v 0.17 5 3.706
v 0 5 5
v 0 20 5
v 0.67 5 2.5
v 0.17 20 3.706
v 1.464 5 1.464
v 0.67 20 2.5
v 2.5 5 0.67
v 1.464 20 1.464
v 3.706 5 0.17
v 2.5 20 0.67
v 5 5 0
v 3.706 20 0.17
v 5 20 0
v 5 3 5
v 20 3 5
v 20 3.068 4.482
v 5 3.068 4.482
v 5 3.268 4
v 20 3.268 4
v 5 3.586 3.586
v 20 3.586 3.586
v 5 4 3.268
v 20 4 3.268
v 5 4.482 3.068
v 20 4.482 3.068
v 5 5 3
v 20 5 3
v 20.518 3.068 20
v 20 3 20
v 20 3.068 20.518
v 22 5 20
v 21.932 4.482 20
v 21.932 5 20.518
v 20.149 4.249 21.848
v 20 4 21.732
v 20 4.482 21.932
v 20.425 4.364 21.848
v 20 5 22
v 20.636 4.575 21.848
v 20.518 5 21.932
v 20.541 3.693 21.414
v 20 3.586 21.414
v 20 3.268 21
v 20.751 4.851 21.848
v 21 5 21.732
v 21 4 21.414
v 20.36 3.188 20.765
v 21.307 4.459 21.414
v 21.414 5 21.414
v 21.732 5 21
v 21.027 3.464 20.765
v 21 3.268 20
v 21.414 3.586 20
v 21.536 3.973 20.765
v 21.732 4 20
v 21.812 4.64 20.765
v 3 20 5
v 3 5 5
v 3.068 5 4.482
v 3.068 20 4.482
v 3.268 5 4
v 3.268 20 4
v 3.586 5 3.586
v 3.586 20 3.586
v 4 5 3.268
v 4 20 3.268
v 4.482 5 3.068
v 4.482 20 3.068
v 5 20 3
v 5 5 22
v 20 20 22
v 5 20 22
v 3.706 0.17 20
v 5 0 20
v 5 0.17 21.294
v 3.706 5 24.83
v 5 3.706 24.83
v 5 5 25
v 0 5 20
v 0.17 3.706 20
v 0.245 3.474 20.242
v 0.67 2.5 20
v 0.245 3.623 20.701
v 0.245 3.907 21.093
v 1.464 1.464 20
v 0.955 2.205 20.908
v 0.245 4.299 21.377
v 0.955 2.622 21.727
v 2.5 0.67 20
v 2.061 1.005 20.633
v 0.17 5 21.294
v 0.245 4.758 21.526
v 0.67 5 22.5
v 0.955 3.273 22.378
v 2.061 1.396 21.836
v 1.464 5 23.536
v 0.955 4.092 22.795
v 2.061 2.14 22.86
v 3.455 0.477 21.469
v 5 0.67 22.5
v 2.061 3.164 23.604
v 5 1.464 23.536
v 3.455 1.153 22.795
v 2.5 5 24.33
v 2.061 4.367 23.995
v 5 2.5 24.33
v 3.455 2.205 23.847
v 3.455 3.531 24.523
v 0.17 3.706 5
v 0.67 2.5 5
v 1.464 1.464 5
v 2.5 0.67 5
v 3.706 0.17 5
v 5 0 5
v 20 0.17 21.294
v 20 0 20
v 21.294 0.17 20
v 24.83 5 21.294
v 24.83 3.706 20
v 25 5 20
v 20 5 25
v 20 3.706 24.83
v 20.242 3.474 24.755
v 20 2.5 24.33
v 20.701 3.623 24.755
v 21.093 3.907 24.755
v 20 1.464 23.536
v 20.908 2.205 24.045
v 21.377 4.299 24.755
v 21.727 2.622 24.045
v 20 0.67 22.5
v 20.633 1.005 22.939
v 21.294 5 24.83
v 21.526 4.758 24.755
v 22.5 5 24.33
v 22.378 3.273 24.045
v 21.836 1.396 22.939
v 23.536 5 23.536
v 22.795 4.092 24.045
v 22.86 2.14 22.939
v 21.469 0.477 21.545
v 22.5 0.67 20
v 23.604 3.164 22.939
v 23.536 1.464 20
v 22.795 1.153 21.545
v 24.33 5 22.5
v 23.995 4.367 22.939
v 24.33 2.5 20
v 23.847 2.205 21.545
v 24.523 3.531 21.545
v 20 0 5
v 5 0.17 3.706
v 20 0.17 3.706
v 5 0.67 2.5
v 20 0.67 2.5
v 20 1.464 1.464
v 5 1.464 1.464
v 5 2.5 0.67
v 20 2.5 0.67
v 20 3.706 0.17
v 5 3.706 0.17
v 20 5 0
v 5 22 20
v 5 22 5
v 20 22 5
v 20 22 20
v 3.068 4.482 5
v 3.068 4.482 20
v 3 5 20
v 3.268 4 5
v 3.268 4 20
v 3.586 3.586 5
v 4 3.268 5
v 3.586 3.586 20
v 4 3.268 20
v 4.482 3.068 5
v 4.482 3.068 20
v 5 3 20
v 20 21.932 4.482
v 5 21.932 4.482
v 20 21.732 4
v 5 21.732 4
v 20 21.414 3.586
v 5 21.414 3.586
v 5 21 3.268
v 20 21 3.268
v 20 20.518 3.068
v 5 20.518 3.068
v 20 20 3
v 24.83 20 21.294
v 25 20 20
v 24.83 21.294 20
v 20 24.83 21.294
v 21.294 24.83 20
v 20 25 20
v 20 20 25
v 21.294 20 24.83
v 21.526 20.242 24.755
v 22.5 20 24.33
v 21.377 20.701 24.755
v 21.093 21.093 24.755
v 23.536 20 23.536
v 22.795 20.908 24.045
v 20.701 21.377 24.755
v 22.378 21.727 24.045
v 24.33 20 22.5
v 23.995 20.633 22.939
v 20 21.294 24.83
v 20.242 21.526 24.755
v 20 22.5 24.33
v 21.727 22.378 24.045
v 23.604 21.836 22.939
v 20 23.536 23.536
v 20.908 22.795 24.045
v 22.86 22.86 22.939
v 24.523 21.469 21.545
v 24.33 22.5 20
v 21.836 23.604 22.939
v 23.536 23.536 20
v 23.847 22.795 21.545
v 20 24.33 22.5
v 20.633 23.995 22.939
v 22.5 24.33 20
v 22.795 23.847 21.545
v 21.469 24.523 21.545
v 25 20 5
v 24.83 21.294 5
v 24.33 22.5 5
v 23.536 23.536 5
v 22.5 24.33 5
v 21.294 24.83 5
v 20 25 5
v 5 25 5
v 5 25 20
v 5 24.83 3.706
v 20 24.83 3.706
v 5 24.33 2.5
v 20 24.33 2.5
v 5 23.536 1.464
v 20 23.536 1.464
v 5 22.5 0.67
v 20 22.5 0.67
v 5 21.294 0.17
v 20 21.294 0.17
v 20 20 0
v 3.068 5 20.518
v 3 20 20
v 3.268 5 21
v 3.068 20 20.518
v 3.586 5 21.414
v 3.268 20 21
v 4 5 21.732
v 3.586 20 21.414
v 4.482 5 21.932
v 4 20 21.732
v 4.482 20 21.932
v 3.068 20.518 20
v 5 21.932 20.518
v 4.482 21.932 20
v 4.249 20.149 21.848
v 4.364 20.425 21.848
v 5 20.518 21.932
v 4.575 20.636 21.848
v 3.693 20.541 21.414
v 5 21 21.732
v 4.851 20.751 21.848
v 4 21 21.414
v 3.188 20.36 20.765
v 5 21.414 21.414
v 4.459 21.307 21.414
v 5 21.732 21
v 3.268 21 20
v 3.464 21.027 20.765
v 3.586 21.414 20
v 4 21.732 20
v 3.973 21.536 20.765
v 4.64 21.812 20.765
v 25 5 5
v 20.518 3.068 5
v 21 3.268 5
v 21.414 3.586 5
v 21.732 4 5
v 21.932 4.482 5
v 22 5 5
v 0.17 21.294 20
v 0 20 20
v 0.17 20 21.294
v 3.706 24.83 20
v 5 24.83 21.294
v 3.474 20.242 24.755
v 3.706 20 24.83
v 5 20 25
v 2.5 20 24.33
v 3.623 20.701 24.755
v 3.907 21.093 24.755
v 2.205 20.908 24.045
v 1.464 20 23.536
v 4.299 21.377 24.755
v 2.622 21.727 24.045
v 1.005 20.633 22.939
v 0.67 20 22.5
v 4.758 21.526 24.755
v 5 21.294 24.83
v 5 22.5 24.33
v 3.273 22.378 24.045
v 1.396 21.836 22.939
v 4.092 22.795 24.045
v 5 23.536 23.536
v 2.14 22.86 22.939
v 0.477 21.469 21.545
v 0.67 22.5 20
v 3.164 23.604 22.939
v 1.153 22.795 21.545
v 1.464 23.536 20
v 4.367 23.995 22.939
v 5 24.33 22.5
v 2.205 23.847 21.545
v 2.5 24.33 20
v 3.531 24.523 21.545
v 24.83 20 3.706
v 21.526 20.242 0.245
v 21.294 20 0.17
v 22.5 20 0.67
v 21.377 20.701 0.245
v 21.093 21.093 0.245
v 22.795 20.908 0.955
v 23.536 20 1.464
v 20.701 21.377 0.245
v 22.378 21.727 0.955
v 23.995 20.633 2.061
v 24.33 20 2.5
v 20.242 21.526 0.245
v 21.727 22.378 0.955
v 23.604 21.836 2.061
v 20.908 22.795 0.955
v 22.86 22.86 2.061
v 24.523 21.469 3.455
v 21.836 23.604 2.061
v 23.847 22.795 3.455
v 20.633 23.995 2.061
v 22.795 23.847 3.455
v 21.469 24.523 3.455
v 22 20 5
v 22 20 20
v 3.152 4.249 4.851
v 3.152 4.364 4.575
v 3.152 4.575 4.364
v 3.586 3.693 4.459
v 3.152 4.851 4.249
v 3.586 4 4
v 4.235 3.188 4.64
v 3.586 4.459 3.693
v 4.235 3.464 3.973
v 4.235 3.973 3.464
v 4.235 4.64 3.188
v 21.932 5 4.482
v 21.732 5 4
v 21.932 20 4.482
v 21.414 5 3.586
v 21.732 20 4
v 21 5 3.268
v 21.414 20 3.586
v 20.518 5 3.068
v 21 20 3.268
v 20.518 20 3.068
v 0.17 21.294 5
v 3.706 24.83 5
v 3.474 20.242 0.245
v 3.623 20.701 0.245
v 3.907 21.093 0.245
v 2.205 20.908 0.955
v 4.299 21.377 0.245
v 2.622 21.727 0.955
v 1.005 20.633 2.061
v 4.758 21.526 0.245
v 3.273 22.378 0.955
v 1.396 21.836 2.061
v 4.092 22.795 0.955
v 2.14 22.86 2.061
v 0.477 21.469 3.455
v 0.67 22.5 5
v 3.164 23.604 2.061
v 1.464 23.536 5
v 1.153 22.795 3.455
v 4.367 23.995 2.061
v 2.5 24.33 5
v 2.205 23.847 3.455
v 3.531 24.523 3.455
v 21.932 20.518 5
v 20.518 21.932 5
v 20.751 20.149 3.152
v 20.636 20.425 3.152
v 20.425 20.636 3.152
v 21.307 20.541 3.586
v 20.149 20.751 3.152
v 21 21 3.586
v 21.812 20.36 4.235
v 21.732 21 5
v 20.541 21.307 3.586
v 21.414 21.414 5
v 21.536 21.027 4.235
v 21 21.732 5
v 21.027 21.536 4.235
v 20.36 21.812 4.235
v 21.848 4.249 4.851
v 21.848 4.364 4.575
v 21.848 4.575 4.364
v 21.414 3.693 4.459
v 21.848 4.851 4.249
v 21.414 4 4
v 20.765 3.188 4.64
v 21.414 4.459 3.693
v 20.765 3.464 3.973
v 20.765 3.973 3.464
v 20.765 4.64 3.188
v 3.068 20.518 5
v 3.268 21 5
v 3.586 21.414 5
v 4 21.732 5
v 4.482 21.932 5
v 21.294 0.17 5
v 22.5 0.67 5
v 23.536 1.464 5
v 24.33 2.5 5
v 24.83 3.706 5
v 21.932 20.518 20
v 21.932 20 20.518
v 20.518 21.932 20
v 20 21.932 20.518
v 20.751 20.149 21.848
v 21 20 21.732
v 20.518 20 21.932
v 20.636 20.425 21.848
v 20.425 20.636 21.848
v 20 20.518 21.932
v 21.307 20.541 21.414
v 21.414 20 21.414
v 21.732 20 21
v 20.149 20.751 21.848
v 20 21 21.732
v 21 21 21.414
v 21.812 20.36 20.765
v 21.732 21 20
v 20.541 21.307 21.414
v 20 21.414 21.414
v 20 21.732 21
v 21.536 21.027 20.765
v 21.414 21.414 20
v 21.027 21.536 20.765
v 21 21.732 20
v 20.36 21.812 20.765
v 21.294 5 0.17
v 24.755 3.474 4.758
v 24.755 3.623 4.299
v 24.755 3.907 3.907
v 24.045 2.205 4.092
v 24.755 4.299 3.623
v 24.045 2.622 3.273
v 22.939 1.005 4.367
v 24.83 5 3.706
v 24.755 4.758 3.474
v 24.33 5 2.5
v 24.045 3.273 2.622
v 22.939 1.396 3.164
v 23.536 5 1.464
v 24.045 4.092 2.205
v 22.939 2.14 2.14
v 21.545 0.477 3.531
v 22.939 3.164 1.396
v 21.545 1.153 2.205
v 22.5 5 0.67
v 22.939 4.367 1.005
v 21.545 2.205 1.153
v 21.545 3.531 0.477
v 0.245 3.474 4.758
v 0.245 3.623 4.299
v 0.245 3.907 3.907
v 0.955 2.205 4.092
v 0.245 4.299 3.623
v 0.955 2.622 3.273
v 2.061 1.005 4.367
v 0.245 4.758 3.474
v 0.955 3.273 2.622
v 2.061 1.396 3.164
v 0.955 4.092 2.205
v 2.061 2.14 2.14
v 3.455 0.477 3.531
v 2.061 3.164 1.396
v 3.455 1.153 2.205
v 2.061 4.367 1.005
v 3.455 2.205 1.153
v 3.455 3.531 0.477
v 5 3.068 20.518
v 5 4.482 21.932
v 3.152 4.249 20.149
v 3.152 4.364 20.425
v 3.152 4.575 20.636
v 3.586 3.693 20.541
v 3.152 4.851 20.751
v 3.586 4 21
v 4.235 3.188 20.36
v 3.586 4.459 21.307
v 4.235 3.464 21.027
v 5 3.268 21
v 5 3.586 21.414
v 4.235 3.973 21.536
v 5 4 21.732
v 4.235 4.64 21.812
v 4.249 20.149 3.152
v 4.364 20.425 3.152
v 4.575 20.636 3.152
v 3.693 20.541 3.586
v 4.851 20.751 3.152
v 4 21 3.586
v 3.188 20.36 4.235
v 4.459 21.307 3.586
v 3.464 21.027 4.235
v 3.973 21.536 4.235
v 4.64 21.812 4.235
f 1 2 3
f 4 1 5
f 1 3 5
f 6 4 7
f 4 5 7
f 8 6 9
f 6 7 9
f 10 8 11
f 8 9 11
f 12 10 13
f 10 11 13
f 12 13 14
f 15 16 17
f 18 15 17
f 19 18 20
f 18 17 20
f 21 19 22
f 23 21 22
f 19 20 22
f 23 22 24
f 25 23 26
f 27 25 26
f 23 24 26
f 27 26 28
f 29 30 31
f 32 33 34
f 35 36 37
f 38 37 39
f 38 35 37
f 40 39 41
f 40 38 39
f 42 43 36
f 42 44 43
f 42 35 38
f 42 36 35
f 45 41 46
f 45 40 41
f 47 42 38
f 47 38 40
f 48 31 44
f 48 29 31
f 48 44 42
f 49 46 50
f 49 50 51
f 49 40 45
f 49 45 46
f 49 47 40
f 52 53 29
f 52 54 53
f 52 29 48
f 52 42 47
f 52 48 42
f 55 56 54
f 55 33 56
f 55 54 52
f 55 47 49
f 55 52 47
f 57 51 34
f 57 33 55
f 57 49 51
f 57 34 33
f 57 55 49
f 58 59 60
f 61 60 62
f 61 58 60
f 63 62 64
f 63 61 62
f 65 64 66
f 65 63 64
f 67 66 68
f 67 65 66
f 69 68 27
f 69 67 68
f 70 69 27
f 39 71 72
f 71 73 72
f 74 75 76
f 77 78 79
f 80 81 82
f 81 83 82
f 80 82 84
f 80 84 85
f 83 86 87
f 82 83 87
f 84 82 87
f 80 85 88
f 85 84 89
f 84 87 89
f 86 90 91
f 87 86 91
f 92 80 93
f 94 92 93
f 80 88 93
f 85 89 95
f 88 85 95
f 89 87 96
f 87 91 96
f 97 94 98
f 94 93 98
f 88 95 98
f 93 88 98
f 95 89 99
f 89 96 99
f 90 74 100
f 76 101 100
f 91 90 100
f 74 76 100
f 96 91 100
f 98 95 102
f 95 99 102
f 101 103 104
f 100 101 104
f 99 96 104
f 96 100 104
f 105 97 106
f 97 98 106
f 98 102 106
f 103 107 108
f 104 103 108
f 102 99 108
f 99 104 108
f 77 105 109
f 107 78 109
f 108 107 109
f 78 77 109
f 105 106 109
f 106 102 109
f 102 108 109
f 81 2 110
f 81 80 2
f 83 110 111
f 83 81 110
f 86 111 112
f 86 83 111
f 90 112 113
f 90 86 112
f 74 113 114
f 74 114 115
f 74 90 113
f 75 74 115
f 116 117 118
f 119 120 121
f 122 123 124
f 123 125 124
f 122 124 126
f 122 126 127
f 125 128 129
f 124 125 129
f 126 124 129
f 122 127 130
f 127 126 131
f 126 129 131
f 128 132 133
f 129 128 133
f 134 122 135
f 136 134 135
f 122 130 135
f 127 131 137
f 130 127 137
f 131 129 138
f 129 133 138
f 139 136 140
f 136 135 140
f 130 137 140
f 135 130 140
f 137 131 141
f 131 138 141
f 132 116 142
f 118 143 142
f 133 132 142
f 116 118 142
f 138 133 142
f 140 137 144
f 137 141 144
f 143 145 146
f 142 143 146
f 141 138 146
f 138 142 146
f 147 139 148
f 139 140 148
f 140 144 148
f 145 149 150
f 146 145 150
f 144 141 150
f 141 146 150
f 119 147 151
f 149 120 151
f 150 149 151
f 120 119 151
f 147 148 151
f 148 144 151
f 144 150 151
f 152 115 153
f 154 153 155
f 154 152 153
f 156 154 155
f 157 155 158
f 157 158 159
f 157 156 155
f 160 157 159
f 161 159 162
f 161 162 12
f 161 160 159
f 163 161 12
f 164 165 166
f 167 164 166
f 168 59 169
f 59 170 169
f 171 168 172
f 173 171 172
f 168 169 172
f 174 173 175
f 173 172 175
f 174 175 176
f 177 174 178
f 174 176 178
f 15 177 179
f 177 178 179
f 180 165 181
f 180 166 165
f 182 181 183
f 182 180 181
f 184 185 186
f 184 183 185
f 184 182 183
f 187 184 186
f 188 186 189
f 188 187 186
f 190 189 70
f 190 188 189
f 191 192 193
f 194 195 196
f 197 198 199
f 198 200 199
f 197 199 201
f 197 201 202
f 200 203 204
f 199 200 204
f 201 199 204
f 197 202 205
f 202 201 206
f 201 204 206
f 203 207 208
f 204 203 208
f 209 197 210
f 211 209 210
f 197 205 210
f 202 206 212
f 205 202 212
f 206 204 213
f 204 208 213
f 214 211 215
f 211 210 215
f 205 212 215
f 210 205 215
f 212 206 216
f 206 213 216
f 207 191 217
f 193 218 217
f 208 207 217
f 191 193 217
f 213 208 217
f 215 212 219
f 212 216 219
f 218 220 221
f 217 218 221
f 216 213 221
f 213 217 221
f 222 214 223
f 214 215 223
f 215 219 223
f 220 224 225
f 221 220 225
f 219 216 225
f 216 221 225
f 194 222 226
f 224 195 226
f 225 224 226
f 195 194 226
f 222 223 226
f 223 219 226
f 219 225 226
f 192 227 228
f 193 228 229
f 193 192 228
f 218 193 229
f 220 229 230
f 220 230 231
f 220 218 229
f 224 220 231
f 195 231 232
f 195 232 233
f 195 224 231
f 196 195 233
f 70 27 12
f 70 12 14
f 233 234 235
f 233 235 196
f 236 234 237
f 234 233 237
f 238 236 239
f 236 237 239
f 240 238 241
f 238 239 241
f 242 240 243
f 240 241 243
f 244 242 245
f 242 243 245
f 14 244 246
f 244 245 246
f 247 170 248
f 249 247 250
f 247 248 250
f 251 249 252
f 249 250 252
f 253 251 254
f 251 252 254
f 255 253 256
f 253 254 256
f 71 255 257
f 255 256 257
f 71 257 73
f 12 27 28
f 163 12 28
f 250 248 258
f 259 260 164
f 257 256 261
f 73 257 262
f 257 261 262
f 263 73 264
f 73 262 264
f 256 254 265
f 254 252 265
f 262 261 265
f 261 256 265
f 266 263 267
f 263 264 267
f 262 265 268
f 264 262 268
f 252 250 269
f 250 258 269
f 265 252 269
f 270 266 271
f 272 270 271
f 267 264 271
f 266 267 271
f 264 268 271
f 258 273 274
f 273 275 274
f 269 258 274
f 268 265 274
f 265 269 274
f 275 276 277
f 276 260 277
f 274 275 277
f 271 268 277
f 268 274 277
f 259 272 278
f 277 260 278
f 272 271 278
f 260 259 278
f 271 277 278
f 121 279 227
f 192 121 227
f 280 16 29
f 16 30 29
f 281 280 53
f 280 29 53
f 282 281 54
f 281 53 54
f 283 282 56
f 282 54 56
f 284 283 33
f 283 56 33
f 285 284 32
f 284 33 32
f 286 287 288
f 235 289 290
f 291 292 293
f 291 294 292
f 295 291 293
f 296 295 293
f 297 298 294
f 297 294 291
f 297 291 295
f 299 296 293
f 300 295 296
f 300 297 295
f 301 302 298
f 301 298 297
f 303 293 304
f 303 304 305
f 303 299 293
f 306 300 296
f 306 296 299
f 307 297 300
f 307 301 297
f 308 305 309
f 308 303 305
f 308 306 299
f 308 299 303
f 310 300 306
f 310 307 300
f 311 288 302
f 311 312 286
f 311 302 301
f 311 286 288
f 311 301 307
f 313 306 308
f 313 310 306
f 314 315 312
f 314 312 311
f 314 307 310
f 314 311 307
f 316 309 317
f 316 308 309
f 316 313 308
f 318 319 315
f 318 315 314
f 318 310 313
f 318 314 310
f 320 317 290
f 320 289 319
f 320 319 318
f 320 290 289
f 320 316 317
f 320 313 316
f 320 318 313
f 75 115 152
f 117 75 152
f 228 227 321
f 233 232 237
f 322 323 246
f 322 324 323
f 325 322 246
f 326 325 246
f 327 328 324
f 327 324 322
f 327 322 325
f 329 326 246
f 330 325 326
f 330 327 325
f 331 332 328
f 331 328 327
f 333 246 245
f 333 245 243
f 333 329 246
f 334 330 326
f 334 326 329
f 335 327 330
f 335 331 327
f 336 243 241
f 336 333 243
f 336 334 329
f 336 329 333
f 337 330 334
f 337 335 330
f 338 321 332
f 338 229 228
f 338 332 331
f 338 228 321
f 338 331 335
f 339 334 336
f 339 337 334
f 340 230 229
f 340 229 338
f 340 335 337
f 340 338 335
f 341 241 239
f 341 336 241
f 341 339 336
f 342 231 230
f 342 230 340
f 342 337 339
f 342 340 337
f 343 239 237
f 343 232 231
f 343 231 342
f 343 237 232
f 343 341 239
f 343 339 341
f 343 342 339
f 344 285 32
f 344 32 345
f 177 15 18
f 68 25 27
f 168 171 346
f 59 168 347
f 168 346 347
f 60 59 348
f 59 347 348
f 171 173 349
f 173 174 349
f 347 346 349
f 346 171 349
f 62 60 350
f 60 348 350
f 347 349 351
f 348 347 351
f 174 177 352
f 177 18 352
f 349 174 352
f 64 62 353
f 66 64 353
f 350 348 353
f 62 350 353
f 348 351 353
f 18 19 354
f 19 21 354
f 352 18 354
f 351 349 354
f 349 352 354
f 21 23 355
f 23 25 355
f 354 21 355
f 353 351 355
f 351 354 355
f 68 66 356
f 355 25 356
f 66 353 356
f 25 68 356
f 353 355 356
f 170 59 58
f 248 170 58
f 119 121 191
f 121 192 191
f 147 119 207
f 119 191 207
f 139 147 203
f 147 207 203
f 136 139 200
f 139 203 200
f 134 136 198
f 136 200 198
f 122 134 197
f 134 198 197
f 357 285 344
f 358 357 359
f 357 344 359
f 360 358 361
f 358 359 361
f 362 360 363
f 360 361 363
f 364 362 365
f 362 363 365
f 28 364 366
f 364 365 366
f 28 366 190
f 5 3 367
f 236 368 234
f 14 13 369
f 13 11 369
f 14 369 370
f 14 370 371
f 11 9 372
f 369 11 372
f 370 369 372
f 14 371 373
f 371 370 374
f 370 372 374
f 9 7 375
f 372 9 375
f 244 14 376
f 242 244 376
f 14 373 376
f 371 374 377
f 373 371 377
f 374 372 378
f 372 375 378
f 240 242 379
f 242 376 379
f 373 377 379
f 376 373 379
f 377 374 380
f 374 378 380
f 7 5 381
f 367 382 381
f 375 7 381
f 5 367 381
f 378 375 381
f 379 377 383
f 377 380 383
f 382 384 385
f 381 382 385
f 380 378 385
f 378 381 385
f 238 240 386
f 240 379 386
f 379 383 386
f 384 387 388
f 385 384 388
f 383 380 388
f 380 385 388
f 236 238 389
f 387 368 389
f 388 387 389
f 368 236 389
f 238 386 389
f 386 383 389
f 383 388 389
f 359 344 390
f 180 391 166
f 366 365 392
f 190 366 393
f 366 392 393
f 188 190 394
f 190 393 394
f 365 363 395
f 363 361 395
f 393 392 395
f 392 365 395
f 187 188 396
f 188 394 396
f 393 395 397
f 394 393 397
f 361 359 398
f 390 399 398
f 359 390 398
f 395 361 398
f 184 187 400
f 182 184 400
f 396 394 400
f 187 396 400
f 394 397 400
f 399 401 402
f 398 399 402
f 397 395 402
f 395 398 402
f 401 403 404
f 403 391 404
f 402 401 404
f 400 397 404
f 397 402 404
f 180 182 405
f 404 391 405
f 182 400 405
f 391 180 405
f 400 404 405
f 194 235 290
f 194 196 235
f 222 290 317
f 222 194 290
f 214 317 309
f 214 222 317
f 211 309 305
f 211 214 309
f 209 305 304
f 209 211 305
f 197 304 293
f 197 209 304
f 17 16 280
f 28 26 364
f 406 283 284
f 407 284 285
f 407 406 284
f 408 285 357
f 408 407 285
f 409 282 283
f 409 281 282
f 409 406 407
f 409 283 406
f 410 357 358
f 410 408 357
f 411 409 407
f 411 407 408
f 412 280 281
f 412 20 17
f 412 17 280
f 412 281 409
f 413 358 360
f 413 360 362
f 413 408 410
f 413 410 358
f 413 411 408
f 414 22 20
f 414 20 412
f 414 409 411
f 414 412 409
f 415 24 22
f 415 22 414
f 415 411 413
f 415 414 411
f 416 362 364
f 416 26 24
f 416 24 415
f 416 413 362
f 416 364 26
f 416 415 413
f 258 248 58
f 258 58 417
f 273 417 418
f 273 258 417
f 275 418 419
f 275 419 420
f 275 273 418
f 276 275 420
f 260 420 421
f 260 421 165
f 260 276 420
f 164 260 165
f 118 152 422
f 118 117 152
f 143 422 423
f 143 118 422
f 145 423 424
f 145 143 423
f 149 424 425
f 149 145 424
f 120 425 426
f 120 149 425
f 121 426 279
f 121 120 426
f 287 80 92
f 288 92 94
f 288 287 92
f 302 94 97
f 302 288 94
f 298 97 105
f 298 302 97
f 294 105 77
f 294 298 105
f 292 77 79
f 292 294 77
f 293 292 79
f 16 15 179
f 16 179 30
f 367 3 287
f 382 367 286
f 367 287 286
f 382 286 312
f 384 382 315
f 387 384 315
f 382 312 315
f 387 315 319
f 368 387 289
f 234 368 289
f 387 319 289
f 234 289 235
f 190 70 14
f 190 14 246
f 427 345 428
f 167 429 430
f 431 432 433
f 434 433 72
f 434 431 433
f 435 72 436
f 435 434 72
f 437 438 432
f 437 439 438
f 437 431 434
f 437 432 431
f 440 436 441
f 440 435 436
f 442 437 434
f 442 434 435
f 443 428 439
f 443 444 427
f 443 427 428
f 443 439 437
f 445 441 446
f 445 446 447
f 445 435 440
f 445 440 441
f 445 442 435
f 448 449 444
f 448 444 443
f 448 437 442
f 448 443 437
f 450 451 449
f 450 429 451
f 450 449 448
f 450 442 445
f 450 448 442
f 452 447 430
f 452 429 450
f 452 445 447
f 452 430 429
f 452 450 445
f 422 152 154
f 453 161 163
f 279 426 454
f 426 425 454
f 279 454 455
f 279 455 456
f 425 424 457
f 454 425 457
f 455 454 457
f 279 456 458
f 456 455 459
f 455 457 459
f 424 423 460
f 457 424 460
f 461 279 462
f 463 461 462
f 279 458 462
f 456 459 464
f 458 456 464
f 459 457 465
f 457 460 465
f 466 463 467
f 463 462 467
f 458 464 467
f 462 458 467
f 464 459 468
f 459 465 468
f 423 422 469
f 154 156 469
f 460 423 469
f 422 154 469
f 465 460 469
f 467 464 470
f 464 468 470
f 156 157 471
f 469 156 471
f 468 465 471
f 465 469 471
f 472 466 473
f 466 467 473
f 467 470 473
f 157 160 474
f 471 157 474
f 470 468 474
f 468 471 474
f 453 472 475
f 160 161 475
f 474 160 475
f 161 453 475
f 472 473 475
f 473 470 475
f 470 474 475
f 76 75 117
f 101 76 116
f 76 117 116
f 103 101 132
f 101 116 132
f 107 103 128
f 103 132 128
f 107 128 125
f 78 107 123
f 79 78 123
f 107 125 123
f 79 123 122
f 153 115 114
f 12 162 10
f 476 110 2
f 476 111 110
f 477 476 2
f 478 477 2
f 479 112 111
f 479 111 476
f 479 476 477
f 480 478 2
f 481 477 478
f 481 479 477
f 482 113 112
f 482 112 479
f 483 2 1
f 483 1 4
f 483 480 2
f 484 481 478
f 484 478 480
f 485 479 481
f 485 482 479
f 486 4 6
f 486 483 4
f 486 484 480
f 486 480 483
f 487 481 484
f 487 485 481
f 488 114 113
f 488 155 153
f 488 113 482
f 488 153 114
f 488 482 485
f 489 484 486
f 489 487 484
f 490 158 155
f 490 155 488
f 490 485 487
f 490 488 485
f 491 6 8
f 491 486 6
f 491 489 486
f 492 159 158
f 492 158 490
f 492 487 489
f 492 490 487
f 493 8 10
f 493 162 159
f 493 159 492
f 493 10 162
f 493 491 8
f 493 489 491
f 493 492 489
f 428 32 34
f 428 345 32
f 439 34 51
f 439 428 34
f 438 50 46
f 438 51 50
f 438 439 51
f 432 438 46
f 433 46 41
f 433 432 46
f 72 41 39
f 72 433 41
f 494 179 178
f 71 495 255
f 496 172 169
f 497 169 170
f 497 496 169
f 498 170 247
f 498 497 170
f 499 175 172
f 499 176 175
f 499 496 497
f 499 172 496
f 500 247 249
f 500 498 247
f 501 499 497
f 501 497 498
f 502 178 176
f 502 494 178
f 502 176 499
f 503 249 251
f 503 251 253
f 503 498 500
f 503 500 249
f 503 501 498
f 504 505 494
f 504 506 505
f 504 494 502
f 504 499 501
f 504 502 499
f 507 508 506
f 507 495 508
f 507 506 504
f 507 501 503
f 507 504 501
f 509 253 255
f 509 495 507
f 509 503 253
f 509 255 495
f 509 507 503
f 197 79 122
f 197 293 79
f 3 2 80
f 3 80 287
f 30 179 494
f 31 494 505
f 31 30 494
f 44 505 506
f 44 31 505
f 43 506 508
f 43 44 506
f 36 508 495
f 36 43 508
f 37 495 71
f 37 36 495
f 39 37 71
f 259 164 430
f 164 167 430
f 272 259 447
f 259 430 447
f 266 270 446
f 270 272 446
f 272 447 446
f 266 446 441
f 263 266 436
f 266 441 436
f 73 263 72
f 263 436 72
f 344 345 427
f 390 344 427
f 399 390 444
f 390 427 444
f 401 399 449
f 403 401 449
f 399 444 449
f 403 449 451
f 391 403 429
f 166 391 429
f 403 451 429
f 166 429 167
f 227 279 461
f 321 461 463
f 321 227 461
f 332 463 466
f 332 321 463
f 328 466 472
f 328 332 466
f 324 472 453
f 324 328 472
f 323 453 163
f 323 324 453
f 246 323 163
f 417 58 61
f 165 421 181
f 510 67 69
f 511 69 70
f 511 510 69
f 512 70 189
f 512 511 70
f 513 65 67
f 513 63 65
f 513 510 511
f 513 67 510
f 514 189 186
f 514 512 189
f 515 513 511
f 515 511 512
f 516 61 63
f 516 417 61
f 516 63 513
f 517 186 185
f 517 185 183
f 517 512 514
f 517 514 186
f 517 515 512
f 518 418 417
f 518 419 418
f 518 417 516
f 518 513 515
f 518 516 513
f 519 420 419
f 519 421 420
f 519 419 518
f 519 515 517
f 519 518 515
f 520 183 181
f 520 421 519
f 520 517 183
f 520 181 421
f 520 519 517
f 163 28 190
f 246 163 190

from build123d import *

# Parameters (mm, degrees)
F0_W     = 25
F0_H     = 25
F1_DEPTH = 25
F2_R     = 5
F3_T     = -3


# Not quite as in the source:
# - a shell that OpenCascade refuses in one call is made with other operations: the cavity is built on its own and cut out


with BuildPart() as f1:
    # F0 (on Top) → F1 (new body)
    with BuildSketch(Plane.XY):
        with Locations((12.5, 12.5)):
            Rectangle(F0_W, F0_H)
    extrude(amount=F1_DEPTH)

    # F2
    f2_edges = [f1.edges().sort_by_distance(p)[0] for p in [
        (12.5, 0, 0),
        (25, 0, 12.5),
        (12.5, 0, 25),
        (25, 25, 12.5),
        (25, 12.5, 0),
        (25, 12.5, 25),
        (0, 25, 12.5),
        (0, 0, 12.5),
        (0, 12.5, 0),
        (0, 12.5, 25),
        (12.5, 25, 0),
        (12.5, 25, 25),
    ]]
    fillet(f2_edges, radius=F2_R)

    # F3: a shell. OpenCascade refuses it in one call, so the cavity is built on its own and cut out:
    # the body offset inwards by the wall thickness, plus a prism from it out through each open face.
    f3_core = offset(f1.part, amount=F3_T, mode=Mode.PRIVATE)
    f3_exits = [f3_core.faces().sort_by_distance(p)[0] for p in [
        (12.5, 12.5, 3),
    ]]
    add(f3_core, mode=Mode.SUBTRACT)
    extrude(f3_exits, amount=-F3_T, mode=Mode.SUBTRACT)


solid = f1.part
